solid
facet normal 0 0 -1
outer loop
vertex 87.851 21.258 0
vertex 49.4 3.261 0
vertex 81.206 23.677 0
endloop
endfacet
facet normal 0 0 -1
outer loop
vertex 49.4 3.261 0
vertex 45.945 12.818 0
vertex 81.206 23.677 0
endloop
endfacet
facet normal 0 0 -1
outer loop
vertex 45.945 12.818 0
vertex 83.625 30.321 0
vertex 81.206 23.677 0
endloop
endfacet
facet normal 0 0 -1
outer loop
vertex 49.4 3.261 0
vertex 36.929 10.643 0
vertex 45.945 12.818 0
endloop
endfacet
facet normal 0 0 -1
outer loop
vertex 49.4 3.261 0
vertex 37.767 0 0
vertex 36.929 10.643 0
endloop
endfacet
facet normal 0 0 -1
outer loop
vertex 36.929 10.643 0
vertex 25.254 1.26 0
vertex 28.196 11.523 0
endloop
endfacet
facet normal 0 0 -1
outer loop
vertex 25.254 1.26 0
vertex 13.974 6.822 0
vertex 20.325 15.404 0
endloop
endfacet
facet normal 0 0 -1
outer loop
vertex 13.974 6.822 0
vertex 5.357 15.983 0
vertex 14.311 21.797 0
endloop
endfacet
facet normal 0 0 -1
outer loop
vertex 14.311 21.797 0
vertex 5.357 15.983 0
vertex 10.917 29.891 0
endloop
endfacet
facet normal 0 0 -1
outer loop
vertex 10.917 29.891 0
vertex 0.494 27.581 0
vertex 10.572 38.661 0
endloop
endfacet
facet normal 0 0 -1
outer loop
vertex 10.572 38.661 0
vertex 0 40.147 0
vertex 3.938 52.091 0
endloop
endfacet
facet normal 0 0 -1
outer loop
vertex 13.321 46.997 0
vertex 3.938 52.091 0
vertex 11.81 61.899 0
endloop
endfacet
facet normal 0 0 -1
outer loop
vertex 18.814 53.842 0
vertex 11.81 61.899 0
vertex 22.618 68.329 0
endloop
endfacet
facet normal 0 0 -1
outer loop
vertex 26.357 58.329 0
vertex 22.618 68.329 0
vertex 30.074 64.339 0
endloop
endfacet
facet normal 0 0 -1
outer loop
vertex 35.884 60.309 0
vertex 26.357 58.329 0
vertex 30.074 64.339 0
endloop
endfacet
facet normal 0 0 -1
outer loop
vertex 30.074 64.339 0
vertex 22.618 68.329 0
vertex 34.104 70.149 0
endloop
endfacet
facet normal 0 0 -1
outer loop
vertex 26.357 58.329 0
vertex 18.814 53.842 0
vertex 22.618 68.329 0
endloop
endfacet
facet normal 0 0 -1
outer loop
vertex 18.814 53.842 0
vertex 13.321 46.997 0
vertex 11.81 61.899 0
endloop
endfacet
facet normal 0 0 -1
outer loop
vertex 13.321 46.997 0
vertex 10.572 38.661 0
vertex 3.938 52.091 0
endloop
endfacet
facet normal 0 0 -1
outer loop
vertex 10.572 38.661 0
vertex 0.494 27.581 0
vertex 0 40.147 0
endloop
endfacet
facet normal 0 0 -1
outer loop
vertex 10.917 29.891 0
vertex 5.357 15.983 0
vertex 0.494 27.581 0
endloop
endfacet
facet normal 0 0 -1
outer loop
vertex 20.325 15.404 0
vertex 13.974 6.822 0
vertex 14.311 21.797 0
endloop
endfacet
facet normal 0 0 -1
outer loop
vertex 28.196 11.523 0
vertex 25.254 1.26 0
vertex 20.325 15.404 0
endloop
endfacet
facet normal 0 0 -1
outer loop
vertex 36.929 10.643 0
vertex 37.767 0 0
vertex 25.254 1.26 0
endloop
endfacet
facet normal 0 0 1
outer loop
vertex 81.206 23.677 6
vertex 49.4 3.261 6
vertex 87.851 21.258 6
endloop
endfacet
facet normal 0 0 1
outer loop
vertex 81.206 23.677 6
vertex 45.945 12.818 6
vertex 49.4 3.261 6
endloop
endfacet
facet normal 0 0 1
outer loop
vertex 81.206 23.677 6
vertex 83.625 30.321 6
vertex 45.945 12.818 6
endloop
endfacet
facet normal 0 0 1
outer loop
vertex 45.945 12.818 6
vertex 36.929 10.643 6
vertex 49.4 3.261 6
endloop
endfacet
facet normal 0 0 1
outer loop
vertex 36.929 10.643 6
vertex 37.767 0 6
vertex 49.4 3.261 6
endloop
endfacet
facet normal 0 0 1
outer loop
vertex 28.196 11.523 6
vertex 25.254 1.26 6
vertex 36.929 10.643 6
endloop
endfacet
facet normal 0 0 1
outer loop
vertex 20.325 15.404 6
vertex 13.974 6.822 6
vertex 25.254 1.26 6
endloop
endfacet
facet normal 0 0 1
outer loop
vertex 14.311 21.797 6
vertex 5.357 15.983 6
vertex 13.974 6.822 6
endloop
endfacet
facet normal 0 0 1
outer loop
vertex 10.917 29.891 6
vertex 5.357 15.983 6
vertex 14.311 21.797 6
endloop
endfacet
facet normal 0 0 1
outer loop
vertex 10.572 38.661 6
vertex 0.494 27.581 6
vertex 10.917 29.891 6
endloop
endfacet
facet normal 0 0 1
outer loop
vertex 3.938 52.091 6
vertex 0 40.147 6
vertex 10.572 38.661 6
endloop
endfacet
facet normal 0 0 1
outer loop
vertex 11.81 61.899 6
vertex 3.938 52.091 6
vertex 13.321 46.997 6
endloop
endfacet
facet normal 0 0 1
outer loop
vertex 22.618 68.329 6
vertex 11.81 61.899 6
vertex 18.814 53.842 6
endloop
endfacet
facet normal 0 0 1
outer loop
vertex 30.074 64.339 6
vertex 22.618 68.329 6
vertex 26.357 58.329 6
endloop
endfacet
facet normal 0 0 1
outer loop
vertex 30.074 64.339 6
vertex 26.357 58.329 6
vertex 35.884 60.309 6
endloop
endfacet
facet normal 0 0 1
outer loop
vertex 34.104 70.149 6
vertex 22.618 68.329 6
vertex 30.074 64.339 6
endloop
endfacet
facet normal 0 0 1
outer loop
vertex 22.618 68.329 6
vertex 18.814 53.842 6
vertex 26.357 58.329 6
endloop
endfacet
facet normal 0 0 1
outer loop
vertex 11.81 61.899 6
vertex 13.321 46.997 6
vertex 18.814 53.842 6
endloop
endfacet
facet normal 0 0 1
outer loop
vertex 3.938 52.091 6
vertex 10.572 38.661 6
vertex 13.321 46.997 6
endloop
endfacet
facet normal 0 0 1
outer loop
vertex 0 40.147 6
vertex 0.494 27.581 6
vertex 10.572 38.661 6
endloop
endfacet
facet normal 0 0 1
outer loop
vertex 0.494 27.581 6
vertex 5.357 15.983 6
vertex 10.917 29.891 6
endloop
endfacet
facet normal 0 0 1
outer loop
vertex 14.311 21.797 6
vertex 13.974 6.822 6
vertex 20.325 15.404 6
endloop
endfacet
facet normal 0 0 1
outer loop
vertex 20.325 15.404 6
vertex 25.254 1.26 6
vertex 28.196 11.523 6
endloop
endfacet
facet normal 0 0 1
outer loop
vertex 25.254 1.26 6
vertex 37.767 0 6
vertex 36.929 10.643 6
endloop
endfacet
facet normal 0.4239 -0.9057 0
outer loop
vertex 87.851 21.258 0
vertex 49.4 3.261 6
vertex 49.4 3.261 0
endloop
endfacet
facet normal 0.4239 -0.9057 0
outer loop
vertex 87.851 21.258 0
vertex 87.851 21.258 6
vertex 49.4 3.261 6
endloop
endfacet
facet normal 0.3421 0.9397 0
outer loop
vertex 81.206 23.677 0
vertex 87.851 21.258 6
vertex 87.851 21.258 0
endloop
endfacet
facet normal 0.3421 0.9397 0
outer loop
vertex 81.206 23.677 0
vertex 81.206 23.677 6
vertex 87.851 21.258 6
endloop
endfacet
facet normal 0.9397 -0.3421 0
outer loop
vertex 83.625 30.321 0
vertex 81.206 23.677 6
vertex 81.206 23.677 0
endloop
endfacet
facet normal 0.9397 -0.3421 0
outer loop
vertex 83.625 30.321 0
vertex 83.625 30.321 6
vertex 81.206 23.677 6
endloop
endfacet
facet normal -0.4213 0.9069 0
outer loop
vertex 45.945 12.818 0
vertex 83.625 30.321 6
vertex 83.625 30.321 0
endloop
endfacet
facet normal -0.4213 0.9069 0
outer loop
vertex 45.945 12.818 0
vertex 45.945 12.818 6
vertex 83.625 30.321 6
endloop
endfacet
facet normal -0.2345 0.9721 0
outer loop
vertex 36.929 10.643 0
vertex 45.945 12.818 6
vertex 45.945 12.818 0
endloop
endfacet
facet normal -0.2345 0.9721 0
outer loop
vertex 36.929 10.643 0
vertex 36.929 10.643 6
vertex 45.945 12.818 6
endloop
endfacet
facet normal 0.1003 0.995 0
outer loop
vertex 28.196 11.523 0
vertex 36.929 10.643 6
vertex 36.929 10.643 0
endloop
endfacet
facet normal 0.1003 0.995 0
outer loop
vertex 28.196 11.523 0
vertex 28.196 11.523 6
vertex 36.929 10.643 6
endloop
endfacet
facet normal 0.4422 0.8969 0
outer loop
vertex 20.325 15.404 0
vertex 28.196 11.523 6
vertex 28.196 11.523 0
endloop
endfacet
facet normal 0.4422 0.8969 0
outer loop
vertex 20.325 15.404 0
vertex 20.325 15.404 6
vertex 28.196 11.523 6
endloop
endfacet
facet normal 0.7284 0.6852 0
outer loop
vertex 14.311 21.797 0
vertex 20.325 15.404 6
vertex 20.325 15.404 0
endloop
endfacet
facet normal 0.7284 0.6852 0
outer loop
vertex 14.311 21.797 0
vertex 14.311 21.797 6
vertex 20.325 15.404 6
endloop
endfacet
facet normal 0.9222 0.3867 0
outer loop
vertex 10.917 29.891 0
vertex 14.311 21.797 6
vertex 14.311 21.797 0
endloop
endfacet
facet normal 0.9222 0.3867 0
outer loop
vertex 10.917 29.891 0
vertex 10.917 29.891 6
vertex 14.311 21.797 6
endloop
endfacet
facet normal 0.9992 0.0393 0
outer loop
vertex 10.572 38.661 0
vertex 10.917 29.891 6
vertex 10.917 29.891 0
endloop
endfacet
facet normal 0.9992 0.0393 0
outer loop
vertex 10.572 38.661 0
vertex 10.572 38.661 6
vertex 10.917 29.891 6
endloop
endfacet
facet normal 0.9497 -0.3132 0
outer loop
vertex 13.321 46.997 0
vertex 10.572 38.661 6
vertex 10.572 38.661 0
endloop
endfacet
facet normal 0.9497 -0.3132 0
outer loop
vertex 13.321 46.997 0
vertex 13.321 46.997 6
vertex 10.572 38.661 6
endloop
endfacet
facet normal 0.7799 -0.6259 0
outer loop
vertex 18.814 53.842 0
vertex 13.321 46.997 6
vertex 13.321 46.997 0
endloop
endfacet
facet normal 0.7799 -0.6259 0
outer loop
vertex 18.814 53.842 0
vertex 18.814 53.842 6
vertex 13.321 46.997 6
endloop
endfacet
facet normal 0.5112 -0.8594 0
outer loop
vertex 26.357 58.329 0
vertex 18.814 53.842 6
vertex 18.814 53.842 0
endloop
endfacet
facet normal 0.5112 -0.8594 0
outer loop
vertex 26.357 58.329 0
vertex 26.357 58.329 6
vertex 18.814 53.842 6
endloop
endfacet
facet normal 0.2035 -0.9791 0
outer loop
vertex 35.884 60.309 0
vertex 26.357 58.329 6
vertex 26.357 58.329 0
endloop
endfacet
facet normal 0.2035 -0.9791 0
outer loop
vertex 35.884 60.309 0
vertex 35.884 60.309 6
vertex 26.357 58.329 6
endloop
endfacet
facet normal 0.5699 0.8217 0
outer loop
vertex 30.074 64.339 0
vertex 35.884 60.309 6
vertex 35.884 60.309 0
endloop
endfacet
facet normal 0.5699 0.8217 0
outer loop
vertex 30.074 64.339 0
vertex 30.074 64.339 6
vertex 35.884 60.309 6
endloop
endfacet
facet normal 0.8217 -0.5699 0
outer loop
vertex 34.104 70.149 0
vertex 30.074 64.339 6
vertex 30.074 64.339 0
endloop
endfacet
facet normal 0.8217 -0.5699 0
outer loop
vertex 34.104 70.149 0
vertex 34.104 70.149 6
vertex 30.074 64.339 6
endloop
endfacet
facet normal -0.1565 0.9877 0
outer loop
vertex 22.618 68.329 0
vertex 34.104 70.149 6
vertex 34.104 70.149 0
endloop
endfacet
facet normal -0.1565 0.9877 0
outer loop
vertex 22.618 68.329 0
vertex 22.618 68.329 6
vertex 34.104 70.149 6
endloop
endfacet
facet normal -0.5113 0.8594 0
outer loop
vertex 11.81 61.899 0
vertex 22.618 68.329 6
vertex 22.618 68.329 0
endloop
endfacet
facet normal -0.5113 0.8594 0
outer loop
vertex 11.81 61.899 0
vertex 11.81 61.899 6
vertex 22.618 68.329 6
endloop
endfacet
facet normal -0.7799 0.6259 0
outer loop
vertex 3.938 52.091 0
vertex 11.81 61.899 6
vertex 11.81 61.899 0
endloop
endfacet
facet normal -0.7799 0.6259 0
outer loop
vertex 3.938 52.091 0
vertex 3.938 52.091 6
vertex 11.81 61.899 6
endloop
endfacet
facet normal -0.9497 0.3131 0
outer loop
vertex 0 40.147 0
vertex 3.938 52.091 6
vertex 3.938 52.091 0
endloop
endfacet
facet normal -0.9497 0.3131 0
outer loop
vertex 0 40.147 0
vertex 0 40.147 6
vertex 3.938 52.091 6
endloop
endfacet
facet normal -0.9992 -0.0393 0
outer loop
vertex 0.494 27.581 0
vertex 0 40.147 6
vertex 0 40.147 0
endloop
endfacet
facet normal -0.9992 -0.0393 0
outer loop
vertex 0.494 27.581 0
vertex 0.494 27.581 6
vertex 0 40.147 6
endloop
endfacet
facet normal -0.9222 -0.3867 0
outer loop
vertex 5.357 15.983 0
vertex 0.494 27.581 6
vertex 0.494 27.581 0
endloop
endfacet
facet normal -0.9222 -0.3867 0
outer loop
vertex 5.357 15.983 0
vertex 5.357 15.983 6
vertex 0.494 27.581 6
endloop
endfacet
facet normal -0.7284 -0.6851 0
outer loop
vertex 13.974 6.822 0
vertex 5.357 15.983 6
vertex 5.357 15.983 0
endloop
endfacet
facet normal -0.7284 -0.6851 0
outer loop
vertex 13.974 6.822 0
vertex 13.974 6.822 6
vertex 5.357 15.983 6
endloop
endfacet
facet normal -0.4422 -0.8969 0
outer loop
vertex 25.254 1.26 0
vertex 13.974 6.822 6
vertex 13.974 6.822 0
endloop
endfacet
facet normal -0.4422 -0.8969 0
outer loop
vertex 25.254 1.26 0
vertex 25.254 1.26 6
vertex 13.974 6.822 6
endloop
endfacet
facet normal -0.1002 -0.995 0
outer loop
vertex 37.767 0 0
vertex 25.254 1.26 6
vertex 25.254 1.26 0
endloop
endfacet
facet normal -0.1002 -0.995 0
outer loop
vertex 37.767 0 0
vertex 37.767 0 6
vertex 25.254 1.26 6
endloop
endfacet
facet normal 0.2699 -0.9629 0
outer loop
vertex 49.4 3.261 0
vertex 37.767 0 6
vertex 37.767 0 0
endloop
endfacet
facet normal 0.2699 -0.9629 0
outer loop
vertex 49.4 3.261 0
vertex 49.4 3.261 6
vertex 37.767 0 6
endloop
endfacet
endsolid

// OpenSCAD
$fn = 32;

// ----------------------------------------------------------------------
// Hook plate: curl radius 30 mm over 205 degrees, 10 mm thick band
// ----------------------------------------------------------------------

// --- parameters (mm) ---
profile_height = 6;       // extrusion height
profile_points = 26;      // points of the closed outline

profile = [[30.074, 64.339], [34.104, 70.149], [22.618, 68.329], [11.81, 61.899], [3.938, 52.091], [0, 40.147], [0.494, 27.581], [5.357, 15.983], [13.974, 6.822], [25.254, 1.26], [37.767, 0], [49.4, 3.261], [87.851, 21.258], [81.206, 23.677], [83.625, 30.321], [45.945, 12.818], [36.929, 10.643], [28.196, 11.523], [20.325, 15.404], [14.311, 21.797], [10.917, 29.891], [10.572, 38.661], [13.321, 46.997], [18.814, 53.842], [26.357, 58.329], [35.884, 60.309]];  // single closed polygon, 26 points, counter clockwise

// --- the one profile operation ---
linear_extrude(height = profile_height) polygon(points = profile);
